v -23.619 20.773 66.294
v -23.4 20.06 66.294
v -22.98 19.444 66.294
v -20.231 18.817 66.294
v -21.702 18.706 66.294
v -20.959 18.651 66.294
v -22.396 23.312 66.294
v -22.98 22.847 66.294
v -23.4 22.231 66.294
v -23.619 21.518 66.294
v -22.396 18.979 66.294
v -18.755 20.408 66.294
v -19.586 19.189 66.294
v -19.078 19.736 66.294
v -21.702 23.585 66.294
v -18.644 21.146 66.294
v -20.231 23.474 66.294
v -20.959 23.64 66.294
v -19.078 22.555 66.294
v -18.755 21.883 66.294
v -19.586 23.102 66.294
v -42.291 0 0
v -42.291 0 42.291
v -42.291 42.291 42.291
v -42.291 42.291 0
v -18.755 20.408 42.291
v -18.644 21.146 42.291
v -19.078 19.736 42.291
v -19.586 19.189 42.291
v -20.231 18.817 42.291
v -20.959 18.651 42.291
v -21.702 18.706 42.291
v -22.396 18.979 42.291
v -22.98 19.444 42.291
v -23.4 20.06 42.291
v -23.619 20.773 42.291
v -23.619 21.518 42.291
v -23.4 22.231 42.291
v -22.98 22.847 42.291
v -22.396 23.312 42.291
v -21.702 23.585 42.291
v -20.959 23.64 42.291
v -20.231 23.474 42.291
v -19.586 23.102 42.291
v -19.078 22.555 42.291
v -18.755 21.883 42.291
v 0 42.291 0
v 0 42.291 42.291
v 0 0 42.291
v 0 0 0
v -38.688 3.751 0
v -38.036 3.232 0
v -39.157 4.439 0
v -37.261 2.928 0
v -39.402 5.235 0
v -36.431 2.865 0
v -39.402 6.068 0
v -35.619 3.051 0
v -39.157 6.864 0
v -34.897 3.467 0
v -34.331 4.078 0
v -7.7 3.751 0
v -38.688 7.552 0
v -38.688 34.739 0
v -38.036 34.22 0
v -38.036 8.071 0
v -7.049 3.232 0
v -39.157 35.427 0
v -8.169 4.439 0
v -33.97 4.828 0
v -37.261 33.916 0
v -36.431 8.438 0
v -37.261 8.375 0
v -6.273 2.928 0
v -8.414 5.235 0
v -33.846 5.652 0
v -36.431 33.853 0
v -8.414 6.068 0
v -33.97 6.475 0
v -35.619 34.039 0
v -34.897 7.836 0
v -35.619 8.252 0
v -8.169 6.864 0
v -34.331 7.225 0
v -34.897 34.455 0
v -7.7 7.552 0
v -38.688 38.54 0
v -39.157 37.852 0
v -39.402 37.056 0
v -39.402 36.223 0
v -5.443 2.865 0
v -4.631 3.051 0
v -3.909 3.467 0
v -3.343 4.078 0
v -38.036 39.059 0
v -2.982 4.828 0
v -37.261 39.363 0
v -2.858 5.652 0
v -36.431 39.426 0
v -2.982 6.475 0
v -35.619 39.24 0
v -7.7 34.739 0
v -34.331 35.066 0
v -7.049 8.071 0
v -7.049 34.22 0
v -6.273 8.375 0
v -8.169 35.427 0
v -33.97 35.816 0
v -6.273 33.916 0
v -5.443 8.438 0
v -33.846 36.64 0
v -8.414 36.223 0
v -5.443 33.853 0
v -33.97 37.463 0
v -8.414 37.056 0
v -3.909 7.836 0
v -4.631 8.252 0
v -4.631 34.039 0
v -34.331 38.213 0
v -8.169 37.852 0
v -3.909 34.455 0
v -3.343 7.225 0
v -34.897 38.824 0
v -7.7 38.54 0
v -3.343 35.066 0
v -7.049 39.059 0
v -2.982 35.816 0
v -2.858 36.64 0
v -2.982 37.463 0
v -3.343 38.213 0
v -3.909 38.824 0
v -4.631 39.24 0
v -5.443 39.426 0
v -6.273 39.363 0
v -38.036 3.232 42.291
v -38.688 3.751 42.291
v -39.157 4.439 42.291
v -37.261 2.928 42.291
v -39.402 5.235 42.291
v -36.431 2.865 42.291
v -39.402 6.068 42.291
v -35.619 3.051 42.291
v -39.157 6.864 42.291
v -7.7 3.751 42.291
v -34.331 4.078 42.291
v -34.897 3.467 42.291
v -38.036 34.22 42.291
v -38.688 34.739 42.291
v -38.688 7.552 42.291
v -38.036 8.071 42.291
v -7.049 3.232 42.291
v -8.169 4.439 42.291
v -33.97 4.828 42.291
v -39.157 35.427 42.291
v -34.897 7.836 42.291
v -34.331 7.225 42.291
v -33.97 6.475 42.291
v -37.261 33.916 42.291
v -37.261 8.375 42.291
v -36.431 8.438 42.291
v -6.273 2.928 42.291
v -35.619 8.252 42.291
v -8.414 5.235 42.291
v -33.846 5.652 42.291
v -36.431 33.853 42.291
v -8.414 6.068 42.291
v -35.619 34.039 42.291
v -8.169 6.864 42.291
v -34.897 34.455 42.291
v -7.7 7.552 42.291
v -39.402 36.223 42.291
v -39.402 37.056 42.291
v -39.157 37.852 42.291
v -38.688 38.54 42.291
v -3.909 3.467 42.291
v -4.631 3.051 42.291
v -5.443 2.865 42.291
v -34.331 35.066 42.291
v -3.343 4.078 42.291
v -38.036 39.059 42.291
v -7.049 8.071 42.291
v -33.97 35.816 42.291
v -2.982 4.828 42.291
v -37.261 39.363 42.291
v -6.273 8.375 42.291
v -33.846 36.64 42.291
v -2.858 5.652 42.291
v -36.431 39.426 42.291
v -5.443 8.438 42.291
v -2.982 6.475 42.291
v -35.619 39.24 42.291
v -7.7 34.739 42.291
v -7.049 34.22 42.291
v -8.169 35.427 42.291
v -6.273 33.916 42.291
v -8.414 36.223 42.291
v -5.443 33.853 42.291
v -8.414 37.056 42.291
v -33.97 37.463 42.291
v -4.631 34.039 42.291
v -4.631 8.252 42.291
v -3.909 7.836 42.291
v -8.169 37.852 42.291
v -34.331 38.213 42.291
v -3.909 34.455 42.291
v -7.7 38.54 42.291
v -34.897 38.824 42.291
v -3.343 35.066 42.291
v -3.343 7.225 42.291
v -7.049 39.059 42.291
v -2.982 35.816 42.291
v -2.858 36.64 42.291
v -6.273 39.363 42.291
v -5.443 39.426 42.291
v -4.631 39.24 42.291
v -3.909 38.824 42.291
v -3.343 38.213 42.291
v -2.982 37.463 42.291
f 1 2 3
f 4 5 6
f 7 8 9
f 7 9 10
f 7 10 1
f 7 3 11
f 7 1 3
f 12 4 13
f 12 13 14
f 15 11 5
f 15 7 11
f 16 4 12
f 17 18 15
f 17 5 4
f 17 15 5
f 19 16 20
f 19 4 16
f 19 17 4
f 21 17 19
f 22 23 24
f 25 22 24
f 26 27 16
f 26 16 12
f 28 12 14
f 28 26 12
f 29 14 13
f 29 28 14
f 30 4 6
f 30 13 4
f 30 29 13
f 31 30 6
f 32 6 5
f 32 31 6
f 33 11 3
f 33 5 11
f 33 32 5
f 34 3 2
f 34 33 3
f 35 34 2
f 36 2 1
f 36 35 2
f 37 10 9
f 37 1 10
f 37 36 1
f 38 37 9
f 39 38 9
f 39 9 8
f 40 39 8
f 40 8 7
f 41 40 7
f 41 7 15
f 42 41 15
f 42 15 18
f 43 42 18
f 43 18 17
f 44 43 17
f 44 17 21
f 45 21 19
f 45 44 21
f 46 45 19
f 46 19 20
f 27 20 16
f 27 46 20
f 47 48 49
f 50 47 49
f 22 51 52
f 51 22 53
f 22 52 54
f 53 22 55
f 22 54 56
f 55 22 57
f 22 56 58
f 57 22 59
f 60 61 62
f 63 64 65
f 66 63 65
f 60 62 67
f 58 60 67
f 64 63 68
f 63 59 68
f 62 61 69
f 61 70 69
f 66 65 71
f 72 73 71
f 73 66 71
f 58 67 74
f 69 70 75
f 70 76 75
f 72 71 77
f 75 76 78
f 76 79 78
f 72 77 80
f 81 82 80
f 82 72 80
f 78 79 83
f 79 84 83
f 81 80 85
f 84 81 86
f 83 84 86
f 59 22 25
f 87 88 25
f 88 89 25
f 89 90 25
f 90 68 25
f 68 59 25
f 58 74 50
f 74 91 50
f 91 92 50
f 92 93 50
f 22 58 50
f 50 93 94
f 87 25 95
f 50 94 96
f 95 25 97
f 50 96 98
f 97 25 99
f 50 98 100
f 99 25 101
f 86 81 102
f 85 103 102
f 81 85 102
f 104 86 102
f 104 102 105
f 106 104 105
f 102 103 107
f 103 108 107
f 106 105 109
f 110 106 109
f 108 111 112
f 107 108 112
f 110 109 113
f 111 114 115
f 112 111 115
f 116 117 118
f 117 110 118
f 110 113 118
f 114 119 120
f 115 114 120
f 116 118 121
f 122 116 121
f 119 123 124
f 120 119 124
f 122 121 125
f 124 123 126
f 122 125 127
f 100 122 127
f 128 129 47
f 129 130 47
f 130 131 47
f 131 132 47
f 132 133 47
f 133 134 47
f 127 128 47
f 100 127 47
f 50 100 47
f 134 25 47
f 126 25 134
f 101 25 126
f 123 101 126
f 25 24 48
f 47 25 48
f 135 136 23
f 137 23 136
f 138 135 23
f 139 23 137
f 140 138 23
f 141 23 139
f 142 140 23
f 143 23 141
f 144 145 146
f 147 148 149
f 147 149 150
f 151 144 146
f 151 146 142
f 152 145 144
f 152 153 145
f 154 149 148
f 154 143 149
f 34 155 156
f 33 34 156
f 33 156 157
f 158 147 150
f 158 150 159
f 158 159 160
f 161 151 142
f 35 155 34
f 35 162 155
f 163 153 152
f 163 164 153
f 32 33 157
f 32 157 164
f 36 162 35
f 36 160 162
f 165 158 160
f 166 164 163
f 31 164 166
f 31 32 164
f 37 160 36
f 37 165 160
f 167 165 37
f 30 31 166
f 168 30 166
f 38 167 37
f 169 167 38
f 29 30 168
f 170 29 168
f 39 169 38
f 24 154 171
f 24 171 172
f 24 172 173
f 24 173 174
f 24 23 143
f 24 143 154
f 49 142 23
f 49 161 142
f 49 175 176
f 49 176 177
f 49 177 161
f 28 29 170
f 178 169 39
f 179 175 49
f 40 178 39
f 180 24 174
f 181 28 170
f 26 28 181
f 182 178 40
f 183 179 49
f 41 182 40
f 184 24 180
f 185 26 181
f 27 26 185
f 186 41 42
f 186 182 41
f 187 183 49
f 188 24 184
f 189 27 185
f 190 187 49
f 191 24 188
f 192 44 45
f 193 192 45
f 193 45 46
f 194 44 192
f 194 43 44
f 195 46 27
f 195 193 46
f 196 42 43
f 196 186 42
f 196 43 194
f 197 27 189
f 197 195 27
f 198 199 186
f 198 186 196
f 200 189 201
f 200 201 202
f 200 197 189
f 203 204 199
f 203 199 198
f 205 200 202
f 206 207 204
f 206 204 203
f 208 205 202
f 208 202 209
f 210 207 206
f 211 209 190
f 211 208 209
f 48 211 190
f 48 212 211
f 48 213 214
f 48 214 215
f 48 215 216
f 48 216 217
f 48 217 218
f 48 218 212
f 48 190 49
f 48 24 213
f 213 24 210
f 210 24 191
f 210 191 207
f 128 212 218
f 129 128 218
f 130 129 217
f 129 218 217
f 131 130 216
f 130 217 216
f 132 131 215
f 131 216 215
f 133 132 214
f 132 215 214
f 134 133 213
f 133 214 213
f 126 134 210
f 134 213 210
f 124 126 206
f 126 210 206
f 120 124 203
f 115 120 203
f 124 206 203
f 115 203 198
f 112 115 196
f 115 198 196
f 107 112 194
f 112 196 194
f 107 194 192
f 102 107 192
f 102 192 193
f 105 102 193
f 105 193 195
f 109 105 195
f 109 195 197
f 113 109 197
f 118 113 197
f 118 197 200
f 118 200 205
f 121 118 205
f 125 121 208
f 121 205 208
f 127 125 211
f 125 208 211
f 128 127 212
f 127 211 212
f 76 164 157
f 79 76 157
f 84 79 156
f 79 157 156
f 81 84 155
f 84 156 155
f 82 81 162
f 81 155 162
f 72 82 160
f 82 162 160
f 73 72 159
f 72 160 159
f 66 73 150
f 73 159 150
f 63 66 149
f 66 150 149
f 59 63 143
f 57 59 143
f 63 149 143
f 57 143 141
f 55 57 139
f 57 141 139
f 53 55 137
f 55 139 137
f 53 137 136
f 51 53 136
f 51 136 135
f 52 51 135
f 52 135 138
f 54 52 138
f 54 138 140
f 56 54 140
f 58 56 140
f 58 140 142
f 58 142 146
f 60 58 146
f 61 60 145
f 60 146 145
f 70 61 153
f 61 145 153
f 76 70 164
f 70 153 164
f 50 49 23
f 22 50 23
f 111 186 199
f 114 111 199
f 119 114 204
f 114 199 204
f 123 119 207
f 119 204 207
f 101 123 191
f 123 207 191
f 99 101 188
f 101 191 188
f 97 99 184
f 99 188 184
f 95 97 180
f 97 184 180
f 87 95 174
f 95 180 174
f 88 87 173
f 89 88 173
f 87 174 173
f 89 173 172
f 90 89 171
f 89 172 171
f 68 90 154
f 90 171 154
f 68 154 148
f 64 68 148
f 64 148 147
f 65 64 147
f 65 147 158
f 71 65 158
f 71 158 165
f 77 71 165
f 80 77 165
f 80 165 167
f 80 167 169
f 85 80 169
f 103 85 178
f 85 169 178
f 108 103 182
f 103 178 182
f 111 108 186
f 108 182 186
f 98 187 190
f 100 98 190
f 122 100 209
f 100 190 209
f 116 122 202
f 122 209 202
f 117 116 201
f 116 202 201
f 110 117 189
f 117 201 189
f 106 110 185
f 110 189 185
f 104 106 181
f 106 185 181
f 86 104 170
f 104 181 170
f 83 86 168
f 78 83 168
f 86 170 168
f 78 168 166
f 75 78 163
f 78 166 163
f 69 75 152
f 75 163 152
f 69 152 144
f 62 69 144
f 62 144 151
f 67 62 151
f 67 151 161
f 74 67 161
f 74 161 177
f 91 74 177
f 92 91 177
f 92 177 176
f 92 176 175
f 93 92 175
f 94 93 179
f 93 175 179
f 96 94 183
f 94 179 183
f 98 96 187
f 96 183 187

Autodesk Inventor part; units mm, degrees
ref_plane "YZ Plane" through (0, 0, 0) normal (1, 0, 0) x (0, 1, 0)
ref_plane "XZ Plane" through (0, 0, 0) normal (0, 1, 0) x (-1, 0, 0)
ref_plane "XY Plane" through (0, 0, 0) normal (0, 0, 1) x (1, 0, 0)
sketch "Sketch1" plane through (0, 0, 0) normal (0, 0, 1) x (1, 0, 0)
  line L0 (0, 0) -> (-42.291, 0)
  line L1 (-42.291, 0) -> (-42.291, 42.291)
  line L2 (-42.291, 42.291) -> (0, 42.291)
  line L3 (0, 42.291) -> (0, 0)
  dimension "d0" = 42.291
  dimension "d1" = 42.291
extrude "Extrusion1" add sketch "Sketch1" along normal blind 42.291
sketch "Sketch2" plane through (0, 0, 42.291) normal (0, 0, 1) x (1, 0, 0)
  line L0 (0, 42.291) -> (-42.291, 42.291) projected
  line L1 (-42.291, 42.291) -> (-42.291, 0) projected
  line L2 (-42.291, 0) -> (0, 0) projected
  line L3 (0, 0) -> (0, 42.291) projected
  line L4 (-5.6515, 5.6515) -> (-36.6395, 5.6515)
  line L5 (-36.6395, 5.6515) -> (-36.6395, 36.6395)
  line L6 (-36.6395, 36.6395) -> (-5.6515, 36.6395)
  line L7 (-5.6515, 36.6395) -> (-5.6515, 5.6515)
  line L8 (-5.6515, 5.6515) -> (-36.6395, 36.6395) construction
  line L9 (-36.6395, 5.6515) -> (-5.6515, 36.6395) construction
  circle A0 centre (-5.6515, 5.6515) radius 2.794
  circle A1 centre (-36.6395, 5.6515) radius 2.794
  circle A2 centre (-36.6395, 36.6395) radius 2.794
  circle A3 centre (-5.6515, 36.6395) radius 2.794
  point P0 (-21.1455, 21.1455)
  dimension "d4" = 30.988
  dimension "d5" = 30.988
  dimension "d8" = 5.588
  dimension "d9" = 5.588
  dimension "d10" = 5.588
  dimension "d11" = 5.588
extrude "Extrusion2" cut sketch "Sketch2" against normal blind 68.834 contours A1 L5 L4 | L4 L5 A1 | A0 L7 L4 | L4 L7 A0 | A2 L6 L5 | L5 L6 A2 | A3 L6 L7 | L7 L6 A3
sketch "Sketch3" plane through (0, 0, 42.291) normal (0, 0, 1) x (1, 0, 0)
  circle A0 centre (-5.6515, 5.6515) radius 2.794 projected
  circle A1 centre (-5.6515, 36.6395) radius 2.794 projected
  circle A2 centre (-36.6395, 5.6515) radius 2.794 projected
  circle A3 centre (-36.6395, 36.6395) radius 2.794 projected
  line L0 (0, 42.291) -> (-42.291, 42.291) projected
  line L1 (-42.291, 42.291) -> (-42.291, 0) projected
  line L2 (-42.291, 0) -> (0, 0) projected
  line L3 (0, 0) -> (0, 42.291) projected
  circle A4 centre (-21.1455, 21.1455) radius 2.5019
  dimension "d14" = 5.0038
extrude "Extrusion3" add sketch "Sketch3" along normal blind 24.003 contours A4
properties part number "Nema 17"
